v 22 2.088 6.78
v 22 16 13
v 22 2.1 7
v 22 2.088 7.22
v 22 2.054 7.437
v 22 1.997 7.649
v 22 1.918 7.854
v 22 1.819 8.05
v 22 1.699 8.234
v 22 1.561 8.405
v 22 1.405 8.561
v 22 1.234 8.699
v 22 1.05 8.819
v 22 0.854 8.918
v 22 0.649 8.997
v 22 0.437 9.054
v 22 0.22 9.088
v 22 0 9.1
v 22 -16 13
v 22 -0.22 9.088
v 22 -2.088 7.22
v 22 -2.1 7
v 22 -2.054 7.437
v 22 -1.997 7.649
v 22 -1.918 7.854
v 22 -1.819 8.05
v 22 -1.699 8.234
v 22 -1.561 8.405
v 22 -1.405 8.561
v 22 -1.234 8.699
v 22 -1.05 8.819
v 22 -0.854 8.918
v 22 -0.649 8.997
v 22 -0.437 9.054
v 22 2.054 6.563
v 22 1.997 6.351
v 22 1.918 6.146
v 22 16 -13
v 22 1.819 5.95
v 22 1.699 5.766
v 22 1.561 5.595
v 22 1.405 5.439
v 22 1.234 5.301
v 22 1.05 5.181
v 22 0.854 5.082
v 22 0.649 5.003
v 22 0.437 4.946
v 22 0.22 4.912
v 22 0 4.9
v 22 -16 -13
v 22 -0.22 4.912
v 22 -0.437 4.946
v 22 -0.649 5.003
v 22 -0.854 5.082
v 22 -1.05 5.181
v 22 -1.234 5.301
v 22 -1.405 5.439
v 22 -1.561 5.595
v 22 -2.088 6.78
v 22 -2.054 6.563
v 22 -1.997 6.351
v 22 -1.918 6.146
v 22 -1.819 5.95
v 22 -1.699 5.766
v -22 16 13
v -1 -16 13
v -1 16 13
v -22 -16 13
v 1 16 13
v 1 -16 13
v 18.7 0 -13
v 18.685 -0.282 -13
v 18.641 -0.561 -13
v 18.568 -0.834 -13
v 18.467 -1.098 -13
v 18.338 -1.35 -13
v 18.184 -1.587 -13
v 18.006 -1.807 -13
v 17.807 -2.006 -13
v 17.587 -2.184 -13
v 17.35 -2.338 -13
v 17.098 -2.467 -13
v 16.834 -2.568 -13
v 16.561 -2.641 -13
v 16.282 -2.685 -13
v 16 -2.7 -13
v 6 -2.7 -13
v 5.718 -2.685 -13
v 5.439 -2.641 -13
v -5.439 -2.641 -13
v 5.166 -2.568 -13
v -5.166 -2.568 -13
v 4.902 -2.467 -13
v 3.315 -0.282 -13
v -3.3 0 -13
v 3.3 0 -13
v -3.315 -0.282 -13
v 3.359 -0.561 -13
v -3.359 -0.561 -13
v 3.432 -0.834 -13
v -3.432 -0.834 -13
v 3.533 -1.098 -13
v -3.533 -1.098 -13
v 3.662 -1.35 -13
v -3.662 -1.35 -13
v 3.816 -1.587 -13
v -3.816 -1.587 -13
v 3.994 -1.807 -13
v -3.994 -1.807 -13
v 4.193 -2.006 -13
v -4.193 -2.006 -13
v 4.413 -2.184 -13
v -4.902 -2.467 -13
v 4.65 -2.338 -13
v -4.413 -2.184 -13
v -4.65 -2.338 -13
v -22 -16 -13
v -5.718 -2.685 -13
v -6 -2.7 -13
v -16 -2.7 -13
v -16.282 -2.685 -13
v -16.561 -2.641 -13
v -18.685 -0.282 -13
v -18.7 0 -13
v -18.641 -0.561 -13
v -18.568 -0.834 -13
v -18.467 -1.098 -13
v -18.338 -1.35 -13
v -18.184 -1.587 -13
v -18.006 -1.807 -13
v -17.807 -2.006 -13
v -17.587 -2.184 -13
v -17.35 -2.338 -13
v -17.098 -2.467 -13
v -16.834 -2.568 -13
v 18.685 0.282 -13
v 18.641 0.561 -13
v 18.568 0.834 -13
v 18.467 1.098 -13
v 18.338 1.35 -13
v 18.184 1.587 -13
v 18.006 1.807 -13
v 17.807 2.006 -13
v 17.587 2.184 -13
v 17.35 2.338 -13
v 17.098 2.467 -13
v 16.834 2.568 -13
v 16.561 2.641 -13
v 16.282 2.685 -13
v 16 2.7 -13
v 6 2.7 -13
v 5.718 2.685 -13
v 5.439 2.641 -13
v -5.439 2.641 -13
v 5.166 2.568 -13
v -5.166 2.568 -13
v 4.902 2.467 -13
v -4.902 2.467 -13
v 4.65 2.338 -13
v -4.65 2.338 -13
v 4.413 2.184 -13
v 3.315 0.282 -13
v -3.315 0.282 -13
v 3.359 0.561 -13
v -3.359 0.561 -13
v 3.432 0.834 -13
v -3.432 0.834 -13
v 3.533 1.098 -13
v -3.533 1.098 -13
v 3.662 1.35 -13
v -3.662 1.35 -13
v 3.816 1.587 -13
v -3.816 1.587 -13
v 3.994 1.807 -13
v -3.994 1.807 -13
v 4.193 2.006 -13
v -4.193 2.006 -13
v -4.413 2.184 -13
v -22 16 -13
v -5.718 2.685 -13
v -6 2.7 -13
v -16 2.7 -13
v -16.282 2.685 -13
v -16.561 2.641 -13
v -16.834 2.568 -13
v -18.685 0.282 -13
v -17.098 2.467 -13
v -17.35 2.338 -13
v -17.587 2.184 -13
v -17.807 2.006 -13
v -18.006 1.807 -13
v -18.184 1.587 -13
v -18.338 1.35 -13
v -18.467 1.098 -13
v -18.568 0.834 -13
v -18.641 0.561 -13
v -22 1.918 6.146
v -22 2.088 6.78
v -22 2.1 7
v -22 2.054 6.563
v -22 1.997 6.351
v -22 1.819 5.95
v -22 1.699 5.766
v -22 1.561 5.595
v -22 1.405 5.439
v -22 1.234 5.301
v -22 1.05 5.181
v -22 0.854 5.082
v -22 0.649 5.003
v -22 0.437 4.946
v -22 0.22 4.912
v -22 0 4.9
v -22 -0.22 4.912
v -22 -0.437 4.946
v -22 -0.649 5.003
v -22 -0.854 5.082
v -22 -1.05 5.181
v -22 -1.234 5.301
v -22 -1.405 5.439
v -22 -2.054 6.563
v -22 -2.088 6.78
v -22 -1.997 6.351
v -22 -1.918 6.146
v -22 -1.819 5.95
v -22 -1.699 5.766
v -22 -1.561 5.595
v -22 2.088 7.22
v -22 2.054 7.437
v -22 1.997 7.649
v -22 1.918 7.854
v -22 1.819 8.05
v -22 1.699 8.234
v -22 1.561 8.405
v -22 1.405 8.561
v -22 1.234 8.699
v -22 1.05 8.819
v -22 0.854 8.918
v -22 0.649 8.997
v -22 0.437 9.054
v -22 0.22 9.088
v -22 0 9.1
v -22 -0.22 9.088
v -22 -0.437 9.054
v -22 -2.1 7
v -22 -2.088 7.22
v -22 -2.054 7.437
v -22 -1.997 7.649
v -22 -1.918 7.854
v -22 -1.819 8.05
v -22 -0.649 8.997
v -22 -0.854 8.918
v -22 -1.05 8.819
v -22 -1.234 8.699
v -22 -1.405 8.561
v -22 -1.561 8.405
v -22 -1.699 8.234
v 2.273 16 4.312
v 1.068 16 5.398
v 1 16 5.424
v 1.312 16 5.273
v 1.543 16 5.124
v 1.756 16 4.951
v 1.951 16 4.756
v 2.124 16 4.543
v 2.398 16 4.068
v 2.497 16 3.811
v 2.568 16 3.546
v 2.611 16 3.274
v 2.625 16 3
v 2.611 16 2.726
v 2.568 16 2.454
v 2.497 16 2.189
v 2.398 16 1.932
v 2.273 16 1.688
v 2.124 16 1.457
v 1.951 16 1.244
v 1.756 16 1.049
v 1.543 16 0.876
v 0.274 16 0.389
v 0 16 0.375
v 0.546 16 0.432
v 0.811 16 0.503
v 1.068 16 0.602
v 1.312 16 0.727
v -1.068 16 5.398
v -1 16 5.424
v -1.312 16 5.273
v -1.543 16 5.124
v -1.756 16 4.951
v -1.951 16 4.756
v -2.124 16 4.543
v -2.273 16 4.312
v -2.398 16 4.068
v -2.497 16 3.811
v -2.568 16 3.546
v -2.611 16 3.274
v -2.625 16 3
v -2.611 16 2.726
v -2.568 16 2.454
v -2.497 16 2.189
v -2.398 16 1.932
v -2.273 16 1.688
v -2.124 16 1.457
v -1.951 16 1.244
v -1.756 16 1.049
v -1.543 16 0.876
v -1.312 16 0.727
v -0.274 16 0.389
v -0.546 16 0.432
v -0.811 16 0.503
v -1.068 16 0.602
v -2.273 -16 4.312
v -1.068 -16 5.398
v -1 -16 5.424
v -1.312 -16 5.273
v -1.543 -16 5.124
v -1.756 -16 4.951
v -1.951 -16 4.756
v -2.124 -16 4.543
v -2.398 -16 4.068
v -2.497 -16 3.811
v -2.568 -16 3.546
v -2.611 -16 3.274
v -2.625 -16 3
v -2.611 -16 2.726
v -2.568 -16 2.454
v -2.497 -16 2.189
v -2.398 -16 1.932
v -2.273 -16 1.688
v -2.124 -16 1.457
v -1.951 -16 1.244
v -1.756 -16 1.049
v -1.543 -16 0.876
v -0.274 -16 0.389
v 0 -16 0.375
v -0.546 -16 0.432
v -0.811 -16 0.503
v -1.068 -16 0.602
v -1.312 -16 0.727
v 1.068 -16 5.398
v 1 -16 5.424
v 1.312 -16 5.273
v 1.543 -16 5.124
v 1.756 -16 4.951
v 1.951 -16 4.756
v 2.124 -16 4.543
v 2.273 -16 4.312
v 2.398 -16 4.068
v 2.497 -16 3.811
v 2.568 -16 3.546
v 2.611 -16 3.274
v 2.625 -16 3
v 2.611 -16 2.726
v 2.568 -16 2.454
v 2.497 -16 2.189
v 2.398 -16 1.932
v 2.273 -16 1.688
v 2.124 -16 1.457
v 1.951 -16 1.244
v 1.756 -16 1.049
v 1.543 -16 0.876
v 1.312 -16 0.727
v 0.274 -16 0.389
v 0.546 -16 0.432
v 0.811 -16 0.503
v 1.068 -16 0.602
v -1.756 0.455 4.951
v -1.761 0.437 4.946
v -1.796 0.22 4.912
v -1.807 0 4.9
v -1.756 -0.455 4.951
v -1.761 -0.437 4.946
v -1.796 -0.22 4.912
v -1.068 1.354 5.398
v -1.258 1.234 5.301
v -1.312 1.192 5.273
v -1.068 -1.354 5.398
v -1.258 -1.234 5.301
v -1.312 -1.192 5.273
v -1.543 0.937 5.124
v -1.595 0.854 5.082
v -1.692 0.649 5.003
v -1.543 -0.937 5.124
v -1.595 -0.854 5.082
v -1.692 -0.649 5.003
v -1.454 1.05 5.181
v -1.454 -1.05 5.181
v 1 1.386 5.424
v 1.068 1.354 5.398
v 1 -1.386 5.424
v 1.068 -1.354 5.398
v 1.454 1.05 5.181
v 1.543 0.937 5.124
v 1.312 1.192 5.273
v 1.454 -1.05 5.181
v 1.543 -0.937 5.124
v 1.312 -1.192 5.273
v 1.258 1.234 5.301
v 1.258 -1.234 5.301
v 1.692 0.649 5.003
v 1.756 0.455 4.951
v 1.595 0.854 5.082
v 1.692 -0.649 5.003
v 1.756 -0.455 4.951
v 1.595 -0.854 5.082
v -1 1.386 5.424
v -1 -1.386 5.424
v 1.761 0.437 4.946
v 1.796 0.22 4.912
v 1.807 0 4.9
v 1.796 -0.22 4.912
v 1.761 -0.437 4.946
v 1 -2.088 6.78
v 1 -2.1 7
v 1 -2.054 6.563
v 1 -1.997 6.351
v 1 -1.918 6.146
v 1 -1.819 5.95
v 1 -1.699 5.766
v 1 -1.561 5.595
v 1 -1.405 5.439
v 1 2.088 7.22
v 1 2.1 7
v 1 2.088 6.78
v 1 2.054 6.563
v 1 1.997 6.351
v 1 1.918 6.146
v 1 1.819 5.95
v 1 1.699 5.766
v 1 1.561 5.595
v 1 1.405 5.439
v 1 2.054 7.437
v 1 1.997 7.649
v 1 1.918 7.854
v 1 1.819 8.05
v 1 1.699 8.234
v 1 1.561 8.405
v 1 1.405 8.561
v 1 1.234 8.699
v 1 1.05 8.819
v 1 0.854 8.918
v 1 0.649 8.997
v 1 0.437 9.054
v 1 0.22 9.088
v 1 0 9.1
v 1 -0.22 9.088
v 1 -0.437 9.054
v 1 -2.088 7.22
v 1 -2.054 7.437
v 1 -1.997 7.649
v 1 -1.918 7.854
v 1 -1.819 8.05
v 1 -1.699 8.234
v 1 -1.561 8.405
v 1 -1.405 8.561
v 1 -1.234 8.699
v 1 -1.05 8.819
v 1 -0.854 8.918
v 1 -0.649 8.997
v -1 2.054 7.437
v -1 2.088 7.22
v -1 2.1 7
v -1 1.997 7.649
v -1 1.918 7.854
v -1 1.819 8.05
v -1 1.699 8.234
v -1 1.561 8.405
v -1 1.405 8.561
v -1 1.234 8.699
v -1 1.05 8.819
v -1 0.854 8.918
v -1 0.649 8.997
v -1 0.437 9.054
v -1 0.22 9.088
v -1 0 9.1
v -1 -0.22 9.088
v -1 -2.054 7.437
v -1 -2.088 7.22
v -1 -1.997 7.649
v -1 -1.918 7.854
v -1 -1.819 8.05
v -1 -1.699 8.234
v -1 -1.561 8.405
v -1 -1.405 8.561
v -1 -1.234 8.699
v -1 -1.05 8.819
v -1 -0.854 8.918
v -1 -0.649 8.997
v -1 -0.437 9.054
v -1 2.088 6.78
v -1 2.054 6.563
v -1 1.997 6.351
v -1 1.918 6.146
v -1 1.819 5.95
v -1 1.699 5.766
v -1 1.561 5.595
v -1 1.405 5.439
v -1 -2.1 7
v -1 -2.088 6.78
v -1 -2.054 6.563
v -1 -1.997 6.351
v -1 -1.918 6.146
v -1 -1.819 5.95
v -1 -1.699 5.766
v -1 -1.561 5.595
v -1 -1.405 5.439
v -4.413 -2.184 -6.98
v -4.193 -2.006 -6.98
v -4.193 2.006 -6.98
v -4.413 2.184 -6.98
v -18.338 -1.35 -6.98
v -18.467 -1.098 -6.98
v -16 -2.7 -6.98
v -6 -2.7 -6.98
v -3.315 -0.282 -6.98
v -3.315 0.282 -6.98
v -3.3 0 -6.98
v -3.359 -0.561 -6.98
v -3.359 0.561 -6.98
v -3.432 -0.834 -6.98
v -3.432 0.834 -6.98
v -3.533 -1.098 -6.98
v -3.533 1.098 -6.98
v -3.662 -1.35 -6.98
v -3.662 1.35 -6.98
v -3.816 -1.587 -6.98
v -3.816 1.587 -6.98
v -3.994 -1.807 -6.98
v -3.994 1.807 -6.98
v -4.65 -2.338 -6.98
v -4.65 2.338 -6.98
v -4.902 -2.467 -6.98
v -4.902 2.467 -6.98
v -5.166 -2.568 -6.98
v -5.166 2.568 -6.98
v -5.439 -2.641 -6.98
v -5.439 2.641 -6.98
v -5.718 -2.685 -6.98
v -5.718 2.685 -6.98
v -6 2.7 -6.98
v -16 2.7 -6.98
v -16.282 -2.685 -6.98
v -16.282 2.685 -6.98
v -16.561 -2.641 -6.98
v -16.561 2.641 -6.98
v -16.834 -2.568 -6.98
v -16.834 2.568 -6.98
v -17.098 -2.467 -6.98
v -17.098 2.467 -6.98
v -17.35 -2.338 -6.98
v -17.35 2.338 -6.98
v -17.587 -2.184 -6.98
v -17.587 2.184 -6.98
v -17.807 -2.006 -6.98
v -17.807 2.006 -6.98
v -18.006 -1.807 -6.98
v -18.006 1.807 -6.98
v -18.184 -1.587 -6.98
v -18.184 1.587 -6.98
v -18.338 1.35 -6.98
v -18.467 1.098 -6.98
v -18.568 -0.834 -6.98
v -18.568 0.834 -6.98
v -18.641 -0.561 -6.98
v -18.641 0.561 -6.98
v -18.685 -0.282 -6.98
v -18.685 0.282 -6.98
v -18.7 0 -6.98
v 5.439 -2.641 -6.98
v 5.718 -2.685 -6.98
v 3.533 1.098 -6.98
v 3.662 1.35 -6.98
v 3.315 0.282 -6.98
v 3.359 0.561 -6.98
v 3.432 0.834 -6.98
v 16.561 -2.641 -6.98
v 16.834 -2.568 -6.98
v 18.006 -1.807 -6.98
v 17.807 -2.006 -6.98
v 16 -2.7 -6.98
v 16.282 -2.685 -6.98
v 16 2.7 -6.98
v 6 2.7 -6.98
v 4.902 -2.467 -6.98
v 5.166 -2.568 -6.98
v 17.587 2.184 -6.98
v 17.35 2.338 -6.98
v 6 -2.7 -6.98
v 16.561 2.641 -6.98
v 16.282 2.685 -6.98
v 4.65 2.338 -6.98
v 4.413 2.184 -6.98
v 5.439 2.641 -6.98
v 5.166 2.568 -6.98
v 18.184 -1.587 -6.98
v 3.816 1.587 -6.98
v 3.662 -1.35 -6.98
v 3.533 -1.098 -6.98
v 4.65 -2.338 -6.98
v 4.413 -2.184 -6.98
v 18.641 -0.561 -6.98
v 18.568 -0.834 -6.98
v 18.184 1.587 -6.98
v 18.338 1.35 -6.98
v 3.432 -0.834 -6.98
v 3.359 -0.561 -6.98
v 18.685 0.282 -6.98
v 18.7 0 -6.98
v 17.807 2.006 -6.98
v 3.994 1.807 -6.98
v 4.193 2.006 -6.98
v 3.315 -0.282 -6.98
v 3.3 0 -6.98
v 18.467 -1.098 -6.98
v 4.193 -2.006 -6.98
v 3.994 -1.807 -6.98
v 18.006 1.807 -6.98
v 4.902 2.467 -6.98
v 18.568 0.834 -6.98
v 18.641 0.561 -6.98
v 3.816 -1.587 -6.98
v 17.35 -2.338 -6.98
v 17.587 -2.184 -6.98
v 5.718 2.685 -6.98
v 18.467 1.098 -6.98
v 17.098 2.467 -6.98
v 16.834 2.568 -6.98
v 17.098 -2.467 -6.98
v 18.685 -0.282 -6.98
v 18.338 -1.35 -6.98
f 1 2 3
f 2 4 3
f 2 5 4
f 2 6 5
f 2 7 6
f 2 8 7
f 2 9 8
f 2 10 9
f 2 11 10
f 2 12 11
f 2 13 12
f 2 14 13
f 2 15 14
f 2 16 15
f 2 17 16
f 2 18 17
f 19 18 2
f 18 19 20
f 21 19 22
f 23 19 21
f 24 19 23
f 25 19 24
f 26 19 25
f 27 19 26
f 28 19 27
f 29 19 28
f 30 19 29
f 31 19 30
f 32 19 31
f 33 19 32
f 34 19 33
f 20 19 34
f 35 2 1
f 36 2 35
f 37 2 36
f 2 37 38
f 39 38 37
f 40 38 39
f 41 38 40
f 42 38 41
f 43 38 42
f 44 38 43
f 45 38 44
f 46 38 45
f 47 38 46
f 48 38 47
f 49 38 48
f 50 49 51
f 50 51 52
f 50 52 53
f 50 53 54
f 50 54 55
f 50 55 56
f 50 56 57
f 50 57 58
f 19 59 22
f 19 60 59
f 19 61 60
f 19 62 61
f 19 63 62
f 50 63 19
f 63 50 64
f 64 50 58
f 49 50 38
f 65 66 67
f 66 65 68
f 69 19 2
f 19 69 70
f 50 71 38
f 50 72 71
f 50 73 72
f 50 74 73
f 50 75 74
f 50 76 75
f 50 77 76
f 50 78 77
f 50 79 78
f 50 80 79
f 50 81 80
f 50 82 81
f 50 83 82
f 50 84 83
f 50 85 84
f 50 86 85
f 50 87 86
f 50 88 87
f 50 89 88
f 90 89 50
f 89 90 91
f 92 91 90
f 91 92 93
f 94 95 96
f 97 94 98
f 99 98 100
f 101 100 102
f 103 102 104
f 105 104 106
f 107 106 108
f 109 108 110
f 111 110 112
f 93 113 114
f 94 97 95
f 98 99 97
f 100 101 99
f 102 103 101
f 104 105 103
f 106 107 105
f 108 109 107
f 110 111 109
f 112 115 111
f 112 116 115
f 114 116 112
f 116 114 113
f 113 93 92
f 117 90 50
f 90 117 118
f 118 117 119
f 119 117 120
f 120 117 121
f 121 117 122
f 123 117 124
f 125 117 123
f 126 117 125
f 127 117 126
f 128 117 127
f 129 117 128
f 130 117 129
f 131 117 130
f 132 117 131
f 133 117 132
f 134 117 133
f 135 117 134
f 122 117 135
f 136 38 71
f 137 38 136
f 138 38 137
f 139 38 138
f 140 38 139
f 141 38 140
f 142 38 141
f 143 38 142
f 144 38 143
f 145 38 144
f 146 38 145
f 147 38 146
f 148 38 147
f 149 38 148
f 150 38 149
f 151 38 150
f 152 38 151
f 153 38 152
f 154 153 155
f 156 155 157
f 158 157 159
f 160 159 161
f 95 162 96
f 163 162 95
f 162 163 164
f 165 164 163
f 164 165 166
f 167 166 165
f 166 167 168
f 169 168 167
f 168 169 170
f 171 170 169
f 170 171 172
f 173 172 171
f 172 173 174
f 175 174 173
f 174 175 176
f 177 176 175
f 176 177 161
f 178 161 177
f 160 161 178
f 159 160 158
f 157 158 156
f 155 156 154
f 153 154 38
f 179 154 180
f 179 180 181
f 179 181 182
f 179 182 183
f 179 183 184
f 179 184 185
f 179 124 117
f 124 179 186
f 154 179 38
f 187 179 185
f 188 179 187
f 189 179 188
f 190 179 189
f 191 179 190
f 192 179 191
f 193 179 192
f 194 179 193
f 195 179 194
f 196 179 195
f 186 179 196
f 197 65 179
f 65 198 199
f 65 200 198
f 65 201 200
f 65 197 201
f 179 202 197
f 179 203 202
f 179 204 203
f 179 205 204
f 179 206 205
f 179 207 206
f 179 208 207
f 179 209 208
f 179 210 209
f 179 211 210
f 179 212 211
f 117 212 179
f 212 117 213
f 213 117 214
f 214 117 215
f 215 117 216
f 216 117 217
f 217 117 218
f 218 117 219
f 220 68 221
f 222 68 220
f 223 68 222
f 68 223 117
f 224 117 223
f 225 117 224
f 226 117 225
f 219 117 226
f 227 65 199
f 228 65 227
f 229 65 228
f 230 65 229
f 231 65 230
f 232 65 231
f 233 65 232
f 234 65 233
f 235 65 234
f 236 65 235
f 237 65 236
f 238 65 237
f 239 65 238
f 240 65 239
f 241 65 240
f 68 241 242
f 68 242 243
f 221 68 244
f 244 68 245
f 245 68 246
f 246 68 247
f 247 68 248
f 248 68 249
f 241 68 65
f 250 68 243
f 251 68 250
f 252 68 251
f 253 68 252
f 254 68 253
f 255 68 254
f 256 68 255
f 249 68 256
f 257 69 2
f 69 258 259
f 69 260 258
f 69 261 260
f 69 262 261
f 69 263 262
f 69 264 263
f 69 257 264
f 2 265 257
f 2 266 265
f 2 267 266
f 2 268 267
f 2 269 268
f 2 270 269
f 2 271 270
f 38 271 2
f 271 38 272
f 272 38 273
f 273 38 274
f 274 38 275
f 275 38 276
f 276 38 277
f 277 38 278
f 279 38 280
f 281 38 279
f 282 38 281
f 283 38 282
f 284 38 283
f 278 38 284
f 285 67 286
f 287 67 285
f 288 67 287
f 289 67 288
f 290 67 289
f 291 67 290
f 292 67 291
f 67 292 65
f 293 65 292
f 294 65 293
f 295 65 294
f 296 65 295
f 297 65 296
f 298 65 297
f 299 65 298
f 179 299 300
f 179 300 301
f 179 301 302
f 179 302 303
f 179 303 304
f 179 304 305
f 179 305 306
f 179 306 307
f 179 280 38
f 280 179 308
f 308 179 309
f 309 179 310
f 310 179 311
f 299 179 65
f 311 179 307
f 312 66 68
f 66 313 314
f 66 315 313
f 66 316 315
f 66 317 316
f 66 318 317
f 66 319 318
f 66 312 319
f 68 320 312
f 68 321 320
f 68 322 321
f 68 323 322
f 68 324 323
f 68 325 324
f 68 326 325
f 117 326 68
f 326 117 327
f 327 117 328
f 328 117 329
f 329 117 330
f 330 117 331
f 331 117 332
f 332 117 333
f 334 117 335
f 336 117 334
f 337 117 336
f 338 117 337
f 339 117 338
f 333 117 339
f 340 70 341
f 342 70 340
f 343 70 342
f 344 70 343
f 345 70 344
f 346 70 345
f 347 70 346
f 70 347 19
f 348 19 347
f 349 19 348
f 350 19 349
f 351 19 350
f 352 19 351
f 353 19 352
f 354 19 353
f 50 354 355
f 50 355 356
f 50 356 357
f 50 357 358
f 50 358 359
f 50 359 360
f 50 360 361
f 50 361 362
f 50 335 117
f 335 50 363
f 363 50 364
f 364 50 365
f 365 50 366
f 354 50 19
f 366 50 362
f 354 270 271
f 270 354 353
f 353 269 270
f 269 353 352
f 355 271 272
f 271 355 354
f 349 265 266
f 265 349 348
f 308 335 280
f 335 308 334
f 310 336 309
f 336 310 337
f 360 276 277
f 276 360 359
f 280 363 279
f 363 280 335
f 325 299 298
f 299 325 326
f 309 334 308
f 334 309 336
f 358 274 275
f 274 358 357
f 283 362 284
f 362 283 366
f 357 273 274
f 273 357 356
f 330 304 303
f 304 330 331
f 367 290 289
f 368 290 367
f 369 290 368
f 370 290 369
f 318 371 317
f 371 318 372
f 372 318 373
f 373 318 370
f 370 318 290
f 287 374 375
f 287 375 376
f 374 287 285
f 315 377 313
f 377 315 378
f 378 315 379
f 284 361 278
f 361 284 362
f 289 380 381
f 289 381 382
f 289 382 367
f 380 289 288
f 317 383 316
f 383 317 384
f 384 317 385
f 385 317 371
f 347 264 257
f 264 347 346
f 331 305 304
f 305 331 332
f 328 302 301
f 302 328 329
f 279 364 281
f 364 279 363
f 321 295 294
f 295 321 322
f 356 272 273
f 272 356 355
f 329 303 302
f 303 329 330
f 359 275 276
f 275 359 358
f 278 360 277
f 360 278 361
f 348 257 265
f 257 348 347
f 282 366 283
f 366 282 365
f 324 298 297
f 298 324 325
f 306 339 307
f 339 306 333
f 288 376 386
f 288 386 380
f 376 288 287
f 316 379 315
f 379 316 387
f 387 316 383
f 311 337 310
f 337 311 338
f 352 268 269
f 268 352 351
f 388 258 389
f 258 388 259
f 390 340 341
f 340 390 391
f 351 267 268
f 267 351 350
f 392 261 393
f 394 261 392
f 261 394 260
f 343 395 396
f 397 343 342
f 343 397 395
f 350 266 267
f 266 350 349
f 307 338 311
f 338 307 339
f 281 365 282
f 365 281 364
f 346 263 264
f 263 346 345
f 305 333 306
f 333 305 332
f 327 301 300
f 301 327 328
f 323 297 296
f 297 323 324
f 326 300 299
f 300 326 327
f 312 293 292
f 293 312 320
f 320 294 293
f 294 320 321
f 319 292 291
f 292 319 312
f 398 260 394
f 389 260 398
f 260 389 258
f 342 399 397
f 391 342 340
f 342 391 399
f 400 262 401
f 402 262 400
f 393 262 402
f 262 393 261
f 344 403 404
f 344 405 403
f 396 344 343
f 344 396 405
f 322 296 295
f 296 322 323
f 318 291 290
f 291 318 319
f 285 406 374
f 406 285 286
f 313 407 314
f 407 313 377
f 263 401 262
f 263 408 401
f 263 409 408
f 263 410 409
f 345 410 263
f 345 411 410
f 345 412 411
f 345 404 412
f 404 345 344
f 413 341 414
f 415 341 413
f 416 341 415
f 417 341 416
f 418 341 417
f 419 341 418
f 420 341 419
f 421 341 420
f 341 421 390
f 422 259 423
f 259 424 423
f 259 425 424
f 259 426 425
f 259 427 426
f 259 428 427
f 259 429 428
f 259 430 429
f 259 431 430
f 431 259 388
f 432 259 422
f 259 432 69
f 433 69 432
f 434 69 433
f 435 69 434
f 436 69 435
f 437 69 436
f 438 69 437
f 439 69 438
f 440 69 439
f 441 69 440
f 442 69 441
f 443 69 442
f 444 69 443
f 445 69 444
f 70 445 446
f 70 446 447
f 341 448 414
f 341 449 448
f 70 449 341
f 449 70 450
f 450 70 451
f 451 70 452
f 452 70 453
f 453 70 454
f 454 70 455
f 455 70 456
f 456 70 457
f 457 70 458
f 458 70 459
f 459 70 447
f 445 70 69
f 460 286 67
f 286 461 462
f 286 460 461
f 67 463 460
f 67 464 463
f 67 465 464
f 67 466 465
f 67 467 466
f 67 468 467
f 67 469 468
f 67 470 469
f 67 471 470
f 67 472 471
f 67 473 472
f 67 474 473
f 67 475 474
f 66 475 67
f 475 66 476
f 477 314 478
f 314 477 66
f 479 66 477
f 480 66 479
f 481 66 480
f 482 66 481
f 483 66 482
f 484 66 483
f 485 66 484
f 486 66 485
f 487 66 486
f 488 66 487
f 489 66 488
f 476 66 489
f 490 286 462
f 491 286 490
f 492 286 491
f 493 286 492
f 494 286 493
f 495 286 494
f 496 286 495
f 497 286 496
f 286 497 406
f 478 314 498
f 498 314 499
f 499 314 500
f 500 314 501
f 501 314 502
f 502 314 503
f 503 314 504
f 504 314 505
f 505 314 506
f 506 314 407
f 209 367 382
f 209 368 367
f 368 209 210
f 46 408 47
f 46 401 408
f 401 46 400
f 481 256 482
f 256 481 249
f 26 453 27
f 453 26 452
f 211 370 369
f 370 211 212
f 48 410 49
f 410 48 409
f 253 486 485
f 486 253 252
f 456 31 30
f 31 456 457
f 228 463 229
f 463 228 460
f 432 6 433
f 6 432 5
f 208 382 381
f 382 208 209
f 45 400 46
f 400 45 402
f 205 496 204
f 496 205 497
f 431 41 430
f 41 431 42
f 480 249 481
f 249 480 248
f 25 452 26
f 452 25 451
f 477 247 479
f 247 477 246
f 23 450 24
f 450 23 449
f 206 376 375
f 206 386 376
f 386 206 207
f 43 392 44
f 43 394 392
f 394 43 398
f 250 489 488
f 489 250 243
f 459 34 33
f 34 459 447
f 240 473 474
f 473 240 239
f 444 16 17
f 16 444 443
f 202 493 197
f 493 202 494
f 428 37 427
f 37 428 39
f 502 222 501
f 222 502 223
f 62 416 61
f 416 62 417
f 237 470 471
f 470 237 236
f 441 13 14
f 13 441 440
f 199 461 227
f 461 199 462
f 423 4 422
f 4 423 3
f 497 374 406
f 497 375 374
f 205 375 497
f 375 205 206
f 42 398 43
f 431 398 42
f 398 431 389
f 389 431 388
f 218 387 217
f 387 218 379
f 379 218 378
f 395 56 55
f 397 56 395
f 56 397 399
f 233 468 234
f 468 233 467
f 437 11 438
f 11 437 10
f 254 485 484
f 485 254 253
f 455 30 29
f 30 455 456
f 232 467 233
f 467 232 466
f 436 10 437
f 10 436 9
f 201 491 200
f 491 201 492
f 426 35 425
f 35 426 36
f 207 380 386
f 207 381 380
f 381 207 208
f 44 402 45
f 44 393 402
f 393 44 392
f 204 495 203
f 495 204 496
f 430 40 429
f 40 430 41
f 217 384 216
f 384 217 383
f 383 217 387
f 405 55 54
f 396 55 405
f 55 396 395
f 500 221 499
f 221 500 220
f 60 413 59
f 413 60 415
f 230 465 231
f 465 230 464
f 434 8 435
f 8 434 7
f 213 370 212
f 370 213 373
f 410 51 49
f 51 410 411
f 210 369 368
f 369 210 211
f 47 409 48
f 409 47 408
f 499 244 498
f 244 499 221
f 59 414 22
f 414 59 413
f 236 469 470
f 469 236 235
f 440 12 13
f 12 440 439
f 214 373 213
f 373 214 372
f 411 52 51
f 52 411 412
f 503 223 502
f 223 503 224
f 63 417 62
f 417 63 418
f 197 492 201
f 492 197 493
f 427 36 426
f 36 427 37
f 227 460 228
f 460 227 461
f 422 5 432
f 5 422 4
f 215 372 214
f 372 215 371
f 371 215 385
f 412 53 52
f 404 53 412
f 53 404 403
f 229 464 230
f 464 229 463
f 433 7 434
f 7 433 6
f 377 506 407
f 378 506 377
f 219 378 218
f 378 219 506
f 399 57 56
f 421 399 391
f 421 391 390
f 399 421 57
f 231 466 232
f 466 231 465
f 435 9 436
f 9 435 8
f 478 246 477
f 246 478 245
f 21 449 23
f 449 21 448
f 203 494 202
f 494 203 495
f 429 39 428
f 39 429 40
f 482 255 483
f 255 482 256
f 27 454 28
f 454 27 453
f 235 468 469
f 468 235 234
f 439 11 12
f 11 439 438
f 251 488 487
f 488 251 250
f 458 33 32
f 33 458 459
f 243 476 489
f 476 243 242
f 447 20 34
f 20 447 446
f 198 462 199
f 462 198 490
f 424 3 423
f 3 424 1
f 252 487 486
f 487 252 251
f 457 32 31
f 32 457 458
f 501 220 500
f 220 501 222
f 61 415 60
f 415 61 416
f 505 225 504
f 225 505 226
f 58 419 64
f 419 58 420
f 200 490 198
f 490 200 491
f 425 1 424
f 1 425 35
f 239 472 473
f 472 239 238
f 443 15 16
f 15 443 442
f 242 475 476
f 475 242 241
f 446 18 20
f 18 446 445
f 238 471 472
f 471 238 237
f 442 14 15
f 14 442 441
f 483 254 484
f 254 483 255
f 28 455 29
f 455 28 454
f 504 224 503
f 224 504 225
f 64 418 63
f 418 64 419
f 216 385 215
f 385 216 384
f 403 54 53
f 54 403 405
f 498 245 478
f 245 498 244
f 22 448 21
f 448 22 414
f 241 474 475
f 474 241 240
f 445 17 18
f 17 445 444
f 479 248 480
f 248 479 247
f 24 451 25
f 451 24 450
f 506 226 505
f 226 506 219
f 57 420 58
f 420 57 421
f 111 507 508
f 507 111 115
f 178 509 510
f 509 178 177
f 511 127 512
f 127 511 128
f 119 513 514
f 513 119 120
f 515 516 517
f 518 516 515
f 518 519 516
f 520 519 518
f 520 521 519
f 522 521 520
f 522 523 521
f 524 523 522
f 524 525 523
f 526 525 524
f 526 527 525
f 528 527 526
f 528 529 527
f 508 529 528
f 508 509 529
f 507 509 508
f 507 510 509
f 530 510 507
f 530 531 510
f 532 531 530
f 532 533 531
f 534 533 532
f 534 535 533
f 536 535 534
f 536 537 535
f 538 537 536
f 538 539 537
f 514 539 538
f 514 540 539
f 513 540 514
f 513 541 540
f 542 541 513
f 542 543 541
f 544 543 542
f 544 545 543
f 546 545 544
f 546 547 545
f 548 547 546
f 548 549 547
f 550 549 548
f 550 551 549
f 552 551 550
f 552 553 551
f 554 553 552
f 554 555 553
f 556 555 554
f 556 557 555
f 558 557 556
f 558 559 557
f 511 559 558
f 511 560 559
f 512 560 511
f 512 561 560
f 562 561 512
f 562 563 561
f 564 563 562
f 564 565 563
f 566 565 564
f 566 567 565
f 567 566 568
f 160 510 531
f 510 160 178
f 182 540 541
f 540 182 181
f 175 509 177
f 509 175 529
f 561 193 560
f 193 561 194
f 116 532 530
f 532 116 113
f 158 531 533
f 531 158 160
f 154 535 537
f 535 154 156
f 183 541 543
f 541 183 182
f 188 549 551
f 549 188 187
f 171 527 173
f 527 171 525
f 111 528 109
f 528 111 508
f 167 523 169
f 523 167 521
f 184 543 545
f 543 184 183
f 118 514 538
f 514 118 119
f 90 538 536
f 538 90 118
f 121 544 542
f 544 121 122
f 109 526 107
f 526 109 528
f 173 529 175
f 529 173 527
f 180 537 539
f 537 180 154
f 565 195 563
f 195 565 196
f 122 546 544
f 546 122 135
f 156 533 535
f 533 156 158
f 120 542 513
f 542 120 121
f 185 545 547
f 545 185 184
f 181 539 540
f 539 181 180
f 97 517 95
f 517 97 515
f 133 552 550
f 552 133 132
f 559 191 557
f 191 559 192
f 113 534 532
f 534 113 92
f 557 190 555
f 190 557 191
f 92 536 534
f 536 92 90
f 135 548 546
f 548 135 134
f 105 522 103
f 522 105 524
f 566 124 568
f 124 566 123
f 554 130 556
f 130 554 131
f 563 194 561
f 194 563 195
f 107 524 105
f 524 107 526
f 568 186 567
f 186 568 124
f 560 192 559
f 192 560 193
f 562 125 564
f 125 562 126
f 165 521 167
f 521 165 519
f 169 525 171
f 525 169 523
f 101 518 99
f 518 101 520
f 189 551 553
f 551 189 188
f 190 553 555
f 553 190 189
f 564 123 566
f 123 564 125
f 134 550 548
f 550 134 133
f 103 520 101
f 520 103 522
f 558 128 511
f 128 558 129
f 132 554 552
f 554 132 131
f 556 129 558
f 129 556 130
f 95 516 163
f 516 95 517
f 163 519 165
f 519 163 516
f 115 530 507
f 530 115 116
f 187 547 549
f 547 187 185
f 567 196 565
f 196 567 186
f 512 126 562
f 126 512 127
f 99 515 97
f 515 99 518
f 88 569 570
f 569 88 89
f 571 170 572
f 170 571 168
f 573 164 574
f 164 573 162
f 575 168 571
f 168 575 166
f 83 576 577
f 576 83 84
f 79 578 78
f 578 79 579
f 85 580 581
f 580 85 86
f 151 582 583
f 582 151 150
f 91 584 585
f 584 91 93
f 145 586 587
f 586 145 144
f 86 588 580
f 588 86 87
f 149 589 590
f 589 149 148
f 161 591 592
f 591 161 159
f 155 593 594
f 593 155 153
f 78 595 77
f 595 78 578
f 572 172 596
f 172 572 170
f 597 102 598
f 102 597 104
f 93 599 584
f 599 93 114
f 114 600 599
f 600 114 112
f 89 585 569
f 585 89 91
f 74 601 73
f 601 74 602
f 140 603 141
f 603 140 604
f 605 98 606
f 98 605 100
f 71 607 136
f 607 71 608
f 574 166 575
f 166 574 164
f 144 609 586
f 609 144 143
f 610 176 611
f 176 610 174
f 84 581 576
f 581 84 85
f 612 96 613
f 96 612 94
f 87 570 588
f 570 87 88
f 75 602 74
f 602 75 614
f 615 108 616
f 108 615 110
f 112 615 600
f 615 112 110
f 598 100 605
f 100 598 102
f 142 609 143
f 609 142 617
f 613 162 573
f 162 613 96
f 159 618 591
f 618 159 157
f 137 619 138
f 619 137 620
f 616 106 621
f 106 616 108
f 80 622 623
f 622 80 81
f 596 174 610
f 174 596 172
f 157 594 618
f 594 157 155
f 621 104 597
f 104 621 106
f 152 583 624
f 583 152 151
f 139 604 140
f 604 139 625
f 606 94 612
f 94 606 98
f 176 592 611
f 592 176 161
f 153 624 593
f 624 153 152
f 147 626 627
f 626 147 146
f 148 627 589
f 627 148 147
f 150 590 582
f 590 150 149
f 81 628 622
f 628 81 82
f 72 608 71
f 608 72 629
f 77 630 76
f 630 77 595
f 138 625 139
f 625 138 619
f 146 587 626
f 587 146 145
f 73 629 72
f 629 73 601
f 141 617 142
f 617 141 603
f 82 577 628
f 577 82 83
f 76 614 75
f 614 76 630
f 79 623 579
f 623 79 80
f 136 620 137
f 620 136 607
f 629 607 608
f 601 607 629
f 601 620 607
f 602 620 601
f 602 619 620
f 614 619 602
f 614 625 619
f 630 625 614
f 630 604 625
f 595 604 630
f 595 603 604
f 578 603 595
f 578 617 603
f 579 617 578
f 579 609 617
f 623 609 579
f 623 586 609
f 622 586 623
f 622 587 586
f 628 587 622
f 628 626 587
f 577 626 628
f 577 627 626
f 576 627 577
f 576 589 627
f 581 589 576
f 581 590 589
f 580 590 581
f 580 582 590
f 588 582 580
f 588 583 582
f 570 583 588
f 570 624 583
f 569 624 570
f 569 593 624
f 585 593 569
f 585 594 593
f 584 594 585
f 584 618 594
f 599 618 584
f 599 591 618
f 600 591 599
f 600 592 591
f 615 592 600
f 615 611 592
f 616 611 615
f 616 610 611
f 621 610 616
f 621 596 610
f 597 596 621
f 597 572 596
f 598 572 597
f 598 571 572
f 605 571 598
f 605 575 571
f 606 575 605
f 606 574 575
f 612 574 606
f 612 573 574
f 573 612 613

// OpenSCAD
// Clamp pedestal for 5 mm shaft.
$fn = 60;
eps = 0.02;
shaft_d = 5;
body_l = 44;
body_d = 32;
body_h = 26;
base_t = 6;
slot_w = 2;
mount_d = 5.4;
module mount_slot(x) {
    hull() {
        translate([x - 5, 0, -body_h / 2 - eps]) cylinder(d = mount_d, h = base_t + 2 * eps);
        translate([x + 5, 0, -body_h / 2 - eps]) cylinder(d = mount_d, h = base_t + 2 * eps);
    }
}
difference() {
    cube([body_l, body_d, body_h], center = true);
    translate([0, -body_d / 2 - eps, 3]) rotate([-90, 0, 0]) cylinder(d = shaft_d + 0.25, h = body_d + 2 * eps);
    translate([-slot_w / 2, -body_d / 2 - eps, 3]) cube([slot_w, body_d + 2 * eps, body_h / 2 + eps]);
    translate([-body_l / 2 - eps, 0, body_h / 2 - 6]) rotate([0, 90, 0]) cylinder(d = 4.2, h = body_l + 2 * eps);
    mount_slot(-body_l / 4);
    mount_slot(body_l / 4);
}
